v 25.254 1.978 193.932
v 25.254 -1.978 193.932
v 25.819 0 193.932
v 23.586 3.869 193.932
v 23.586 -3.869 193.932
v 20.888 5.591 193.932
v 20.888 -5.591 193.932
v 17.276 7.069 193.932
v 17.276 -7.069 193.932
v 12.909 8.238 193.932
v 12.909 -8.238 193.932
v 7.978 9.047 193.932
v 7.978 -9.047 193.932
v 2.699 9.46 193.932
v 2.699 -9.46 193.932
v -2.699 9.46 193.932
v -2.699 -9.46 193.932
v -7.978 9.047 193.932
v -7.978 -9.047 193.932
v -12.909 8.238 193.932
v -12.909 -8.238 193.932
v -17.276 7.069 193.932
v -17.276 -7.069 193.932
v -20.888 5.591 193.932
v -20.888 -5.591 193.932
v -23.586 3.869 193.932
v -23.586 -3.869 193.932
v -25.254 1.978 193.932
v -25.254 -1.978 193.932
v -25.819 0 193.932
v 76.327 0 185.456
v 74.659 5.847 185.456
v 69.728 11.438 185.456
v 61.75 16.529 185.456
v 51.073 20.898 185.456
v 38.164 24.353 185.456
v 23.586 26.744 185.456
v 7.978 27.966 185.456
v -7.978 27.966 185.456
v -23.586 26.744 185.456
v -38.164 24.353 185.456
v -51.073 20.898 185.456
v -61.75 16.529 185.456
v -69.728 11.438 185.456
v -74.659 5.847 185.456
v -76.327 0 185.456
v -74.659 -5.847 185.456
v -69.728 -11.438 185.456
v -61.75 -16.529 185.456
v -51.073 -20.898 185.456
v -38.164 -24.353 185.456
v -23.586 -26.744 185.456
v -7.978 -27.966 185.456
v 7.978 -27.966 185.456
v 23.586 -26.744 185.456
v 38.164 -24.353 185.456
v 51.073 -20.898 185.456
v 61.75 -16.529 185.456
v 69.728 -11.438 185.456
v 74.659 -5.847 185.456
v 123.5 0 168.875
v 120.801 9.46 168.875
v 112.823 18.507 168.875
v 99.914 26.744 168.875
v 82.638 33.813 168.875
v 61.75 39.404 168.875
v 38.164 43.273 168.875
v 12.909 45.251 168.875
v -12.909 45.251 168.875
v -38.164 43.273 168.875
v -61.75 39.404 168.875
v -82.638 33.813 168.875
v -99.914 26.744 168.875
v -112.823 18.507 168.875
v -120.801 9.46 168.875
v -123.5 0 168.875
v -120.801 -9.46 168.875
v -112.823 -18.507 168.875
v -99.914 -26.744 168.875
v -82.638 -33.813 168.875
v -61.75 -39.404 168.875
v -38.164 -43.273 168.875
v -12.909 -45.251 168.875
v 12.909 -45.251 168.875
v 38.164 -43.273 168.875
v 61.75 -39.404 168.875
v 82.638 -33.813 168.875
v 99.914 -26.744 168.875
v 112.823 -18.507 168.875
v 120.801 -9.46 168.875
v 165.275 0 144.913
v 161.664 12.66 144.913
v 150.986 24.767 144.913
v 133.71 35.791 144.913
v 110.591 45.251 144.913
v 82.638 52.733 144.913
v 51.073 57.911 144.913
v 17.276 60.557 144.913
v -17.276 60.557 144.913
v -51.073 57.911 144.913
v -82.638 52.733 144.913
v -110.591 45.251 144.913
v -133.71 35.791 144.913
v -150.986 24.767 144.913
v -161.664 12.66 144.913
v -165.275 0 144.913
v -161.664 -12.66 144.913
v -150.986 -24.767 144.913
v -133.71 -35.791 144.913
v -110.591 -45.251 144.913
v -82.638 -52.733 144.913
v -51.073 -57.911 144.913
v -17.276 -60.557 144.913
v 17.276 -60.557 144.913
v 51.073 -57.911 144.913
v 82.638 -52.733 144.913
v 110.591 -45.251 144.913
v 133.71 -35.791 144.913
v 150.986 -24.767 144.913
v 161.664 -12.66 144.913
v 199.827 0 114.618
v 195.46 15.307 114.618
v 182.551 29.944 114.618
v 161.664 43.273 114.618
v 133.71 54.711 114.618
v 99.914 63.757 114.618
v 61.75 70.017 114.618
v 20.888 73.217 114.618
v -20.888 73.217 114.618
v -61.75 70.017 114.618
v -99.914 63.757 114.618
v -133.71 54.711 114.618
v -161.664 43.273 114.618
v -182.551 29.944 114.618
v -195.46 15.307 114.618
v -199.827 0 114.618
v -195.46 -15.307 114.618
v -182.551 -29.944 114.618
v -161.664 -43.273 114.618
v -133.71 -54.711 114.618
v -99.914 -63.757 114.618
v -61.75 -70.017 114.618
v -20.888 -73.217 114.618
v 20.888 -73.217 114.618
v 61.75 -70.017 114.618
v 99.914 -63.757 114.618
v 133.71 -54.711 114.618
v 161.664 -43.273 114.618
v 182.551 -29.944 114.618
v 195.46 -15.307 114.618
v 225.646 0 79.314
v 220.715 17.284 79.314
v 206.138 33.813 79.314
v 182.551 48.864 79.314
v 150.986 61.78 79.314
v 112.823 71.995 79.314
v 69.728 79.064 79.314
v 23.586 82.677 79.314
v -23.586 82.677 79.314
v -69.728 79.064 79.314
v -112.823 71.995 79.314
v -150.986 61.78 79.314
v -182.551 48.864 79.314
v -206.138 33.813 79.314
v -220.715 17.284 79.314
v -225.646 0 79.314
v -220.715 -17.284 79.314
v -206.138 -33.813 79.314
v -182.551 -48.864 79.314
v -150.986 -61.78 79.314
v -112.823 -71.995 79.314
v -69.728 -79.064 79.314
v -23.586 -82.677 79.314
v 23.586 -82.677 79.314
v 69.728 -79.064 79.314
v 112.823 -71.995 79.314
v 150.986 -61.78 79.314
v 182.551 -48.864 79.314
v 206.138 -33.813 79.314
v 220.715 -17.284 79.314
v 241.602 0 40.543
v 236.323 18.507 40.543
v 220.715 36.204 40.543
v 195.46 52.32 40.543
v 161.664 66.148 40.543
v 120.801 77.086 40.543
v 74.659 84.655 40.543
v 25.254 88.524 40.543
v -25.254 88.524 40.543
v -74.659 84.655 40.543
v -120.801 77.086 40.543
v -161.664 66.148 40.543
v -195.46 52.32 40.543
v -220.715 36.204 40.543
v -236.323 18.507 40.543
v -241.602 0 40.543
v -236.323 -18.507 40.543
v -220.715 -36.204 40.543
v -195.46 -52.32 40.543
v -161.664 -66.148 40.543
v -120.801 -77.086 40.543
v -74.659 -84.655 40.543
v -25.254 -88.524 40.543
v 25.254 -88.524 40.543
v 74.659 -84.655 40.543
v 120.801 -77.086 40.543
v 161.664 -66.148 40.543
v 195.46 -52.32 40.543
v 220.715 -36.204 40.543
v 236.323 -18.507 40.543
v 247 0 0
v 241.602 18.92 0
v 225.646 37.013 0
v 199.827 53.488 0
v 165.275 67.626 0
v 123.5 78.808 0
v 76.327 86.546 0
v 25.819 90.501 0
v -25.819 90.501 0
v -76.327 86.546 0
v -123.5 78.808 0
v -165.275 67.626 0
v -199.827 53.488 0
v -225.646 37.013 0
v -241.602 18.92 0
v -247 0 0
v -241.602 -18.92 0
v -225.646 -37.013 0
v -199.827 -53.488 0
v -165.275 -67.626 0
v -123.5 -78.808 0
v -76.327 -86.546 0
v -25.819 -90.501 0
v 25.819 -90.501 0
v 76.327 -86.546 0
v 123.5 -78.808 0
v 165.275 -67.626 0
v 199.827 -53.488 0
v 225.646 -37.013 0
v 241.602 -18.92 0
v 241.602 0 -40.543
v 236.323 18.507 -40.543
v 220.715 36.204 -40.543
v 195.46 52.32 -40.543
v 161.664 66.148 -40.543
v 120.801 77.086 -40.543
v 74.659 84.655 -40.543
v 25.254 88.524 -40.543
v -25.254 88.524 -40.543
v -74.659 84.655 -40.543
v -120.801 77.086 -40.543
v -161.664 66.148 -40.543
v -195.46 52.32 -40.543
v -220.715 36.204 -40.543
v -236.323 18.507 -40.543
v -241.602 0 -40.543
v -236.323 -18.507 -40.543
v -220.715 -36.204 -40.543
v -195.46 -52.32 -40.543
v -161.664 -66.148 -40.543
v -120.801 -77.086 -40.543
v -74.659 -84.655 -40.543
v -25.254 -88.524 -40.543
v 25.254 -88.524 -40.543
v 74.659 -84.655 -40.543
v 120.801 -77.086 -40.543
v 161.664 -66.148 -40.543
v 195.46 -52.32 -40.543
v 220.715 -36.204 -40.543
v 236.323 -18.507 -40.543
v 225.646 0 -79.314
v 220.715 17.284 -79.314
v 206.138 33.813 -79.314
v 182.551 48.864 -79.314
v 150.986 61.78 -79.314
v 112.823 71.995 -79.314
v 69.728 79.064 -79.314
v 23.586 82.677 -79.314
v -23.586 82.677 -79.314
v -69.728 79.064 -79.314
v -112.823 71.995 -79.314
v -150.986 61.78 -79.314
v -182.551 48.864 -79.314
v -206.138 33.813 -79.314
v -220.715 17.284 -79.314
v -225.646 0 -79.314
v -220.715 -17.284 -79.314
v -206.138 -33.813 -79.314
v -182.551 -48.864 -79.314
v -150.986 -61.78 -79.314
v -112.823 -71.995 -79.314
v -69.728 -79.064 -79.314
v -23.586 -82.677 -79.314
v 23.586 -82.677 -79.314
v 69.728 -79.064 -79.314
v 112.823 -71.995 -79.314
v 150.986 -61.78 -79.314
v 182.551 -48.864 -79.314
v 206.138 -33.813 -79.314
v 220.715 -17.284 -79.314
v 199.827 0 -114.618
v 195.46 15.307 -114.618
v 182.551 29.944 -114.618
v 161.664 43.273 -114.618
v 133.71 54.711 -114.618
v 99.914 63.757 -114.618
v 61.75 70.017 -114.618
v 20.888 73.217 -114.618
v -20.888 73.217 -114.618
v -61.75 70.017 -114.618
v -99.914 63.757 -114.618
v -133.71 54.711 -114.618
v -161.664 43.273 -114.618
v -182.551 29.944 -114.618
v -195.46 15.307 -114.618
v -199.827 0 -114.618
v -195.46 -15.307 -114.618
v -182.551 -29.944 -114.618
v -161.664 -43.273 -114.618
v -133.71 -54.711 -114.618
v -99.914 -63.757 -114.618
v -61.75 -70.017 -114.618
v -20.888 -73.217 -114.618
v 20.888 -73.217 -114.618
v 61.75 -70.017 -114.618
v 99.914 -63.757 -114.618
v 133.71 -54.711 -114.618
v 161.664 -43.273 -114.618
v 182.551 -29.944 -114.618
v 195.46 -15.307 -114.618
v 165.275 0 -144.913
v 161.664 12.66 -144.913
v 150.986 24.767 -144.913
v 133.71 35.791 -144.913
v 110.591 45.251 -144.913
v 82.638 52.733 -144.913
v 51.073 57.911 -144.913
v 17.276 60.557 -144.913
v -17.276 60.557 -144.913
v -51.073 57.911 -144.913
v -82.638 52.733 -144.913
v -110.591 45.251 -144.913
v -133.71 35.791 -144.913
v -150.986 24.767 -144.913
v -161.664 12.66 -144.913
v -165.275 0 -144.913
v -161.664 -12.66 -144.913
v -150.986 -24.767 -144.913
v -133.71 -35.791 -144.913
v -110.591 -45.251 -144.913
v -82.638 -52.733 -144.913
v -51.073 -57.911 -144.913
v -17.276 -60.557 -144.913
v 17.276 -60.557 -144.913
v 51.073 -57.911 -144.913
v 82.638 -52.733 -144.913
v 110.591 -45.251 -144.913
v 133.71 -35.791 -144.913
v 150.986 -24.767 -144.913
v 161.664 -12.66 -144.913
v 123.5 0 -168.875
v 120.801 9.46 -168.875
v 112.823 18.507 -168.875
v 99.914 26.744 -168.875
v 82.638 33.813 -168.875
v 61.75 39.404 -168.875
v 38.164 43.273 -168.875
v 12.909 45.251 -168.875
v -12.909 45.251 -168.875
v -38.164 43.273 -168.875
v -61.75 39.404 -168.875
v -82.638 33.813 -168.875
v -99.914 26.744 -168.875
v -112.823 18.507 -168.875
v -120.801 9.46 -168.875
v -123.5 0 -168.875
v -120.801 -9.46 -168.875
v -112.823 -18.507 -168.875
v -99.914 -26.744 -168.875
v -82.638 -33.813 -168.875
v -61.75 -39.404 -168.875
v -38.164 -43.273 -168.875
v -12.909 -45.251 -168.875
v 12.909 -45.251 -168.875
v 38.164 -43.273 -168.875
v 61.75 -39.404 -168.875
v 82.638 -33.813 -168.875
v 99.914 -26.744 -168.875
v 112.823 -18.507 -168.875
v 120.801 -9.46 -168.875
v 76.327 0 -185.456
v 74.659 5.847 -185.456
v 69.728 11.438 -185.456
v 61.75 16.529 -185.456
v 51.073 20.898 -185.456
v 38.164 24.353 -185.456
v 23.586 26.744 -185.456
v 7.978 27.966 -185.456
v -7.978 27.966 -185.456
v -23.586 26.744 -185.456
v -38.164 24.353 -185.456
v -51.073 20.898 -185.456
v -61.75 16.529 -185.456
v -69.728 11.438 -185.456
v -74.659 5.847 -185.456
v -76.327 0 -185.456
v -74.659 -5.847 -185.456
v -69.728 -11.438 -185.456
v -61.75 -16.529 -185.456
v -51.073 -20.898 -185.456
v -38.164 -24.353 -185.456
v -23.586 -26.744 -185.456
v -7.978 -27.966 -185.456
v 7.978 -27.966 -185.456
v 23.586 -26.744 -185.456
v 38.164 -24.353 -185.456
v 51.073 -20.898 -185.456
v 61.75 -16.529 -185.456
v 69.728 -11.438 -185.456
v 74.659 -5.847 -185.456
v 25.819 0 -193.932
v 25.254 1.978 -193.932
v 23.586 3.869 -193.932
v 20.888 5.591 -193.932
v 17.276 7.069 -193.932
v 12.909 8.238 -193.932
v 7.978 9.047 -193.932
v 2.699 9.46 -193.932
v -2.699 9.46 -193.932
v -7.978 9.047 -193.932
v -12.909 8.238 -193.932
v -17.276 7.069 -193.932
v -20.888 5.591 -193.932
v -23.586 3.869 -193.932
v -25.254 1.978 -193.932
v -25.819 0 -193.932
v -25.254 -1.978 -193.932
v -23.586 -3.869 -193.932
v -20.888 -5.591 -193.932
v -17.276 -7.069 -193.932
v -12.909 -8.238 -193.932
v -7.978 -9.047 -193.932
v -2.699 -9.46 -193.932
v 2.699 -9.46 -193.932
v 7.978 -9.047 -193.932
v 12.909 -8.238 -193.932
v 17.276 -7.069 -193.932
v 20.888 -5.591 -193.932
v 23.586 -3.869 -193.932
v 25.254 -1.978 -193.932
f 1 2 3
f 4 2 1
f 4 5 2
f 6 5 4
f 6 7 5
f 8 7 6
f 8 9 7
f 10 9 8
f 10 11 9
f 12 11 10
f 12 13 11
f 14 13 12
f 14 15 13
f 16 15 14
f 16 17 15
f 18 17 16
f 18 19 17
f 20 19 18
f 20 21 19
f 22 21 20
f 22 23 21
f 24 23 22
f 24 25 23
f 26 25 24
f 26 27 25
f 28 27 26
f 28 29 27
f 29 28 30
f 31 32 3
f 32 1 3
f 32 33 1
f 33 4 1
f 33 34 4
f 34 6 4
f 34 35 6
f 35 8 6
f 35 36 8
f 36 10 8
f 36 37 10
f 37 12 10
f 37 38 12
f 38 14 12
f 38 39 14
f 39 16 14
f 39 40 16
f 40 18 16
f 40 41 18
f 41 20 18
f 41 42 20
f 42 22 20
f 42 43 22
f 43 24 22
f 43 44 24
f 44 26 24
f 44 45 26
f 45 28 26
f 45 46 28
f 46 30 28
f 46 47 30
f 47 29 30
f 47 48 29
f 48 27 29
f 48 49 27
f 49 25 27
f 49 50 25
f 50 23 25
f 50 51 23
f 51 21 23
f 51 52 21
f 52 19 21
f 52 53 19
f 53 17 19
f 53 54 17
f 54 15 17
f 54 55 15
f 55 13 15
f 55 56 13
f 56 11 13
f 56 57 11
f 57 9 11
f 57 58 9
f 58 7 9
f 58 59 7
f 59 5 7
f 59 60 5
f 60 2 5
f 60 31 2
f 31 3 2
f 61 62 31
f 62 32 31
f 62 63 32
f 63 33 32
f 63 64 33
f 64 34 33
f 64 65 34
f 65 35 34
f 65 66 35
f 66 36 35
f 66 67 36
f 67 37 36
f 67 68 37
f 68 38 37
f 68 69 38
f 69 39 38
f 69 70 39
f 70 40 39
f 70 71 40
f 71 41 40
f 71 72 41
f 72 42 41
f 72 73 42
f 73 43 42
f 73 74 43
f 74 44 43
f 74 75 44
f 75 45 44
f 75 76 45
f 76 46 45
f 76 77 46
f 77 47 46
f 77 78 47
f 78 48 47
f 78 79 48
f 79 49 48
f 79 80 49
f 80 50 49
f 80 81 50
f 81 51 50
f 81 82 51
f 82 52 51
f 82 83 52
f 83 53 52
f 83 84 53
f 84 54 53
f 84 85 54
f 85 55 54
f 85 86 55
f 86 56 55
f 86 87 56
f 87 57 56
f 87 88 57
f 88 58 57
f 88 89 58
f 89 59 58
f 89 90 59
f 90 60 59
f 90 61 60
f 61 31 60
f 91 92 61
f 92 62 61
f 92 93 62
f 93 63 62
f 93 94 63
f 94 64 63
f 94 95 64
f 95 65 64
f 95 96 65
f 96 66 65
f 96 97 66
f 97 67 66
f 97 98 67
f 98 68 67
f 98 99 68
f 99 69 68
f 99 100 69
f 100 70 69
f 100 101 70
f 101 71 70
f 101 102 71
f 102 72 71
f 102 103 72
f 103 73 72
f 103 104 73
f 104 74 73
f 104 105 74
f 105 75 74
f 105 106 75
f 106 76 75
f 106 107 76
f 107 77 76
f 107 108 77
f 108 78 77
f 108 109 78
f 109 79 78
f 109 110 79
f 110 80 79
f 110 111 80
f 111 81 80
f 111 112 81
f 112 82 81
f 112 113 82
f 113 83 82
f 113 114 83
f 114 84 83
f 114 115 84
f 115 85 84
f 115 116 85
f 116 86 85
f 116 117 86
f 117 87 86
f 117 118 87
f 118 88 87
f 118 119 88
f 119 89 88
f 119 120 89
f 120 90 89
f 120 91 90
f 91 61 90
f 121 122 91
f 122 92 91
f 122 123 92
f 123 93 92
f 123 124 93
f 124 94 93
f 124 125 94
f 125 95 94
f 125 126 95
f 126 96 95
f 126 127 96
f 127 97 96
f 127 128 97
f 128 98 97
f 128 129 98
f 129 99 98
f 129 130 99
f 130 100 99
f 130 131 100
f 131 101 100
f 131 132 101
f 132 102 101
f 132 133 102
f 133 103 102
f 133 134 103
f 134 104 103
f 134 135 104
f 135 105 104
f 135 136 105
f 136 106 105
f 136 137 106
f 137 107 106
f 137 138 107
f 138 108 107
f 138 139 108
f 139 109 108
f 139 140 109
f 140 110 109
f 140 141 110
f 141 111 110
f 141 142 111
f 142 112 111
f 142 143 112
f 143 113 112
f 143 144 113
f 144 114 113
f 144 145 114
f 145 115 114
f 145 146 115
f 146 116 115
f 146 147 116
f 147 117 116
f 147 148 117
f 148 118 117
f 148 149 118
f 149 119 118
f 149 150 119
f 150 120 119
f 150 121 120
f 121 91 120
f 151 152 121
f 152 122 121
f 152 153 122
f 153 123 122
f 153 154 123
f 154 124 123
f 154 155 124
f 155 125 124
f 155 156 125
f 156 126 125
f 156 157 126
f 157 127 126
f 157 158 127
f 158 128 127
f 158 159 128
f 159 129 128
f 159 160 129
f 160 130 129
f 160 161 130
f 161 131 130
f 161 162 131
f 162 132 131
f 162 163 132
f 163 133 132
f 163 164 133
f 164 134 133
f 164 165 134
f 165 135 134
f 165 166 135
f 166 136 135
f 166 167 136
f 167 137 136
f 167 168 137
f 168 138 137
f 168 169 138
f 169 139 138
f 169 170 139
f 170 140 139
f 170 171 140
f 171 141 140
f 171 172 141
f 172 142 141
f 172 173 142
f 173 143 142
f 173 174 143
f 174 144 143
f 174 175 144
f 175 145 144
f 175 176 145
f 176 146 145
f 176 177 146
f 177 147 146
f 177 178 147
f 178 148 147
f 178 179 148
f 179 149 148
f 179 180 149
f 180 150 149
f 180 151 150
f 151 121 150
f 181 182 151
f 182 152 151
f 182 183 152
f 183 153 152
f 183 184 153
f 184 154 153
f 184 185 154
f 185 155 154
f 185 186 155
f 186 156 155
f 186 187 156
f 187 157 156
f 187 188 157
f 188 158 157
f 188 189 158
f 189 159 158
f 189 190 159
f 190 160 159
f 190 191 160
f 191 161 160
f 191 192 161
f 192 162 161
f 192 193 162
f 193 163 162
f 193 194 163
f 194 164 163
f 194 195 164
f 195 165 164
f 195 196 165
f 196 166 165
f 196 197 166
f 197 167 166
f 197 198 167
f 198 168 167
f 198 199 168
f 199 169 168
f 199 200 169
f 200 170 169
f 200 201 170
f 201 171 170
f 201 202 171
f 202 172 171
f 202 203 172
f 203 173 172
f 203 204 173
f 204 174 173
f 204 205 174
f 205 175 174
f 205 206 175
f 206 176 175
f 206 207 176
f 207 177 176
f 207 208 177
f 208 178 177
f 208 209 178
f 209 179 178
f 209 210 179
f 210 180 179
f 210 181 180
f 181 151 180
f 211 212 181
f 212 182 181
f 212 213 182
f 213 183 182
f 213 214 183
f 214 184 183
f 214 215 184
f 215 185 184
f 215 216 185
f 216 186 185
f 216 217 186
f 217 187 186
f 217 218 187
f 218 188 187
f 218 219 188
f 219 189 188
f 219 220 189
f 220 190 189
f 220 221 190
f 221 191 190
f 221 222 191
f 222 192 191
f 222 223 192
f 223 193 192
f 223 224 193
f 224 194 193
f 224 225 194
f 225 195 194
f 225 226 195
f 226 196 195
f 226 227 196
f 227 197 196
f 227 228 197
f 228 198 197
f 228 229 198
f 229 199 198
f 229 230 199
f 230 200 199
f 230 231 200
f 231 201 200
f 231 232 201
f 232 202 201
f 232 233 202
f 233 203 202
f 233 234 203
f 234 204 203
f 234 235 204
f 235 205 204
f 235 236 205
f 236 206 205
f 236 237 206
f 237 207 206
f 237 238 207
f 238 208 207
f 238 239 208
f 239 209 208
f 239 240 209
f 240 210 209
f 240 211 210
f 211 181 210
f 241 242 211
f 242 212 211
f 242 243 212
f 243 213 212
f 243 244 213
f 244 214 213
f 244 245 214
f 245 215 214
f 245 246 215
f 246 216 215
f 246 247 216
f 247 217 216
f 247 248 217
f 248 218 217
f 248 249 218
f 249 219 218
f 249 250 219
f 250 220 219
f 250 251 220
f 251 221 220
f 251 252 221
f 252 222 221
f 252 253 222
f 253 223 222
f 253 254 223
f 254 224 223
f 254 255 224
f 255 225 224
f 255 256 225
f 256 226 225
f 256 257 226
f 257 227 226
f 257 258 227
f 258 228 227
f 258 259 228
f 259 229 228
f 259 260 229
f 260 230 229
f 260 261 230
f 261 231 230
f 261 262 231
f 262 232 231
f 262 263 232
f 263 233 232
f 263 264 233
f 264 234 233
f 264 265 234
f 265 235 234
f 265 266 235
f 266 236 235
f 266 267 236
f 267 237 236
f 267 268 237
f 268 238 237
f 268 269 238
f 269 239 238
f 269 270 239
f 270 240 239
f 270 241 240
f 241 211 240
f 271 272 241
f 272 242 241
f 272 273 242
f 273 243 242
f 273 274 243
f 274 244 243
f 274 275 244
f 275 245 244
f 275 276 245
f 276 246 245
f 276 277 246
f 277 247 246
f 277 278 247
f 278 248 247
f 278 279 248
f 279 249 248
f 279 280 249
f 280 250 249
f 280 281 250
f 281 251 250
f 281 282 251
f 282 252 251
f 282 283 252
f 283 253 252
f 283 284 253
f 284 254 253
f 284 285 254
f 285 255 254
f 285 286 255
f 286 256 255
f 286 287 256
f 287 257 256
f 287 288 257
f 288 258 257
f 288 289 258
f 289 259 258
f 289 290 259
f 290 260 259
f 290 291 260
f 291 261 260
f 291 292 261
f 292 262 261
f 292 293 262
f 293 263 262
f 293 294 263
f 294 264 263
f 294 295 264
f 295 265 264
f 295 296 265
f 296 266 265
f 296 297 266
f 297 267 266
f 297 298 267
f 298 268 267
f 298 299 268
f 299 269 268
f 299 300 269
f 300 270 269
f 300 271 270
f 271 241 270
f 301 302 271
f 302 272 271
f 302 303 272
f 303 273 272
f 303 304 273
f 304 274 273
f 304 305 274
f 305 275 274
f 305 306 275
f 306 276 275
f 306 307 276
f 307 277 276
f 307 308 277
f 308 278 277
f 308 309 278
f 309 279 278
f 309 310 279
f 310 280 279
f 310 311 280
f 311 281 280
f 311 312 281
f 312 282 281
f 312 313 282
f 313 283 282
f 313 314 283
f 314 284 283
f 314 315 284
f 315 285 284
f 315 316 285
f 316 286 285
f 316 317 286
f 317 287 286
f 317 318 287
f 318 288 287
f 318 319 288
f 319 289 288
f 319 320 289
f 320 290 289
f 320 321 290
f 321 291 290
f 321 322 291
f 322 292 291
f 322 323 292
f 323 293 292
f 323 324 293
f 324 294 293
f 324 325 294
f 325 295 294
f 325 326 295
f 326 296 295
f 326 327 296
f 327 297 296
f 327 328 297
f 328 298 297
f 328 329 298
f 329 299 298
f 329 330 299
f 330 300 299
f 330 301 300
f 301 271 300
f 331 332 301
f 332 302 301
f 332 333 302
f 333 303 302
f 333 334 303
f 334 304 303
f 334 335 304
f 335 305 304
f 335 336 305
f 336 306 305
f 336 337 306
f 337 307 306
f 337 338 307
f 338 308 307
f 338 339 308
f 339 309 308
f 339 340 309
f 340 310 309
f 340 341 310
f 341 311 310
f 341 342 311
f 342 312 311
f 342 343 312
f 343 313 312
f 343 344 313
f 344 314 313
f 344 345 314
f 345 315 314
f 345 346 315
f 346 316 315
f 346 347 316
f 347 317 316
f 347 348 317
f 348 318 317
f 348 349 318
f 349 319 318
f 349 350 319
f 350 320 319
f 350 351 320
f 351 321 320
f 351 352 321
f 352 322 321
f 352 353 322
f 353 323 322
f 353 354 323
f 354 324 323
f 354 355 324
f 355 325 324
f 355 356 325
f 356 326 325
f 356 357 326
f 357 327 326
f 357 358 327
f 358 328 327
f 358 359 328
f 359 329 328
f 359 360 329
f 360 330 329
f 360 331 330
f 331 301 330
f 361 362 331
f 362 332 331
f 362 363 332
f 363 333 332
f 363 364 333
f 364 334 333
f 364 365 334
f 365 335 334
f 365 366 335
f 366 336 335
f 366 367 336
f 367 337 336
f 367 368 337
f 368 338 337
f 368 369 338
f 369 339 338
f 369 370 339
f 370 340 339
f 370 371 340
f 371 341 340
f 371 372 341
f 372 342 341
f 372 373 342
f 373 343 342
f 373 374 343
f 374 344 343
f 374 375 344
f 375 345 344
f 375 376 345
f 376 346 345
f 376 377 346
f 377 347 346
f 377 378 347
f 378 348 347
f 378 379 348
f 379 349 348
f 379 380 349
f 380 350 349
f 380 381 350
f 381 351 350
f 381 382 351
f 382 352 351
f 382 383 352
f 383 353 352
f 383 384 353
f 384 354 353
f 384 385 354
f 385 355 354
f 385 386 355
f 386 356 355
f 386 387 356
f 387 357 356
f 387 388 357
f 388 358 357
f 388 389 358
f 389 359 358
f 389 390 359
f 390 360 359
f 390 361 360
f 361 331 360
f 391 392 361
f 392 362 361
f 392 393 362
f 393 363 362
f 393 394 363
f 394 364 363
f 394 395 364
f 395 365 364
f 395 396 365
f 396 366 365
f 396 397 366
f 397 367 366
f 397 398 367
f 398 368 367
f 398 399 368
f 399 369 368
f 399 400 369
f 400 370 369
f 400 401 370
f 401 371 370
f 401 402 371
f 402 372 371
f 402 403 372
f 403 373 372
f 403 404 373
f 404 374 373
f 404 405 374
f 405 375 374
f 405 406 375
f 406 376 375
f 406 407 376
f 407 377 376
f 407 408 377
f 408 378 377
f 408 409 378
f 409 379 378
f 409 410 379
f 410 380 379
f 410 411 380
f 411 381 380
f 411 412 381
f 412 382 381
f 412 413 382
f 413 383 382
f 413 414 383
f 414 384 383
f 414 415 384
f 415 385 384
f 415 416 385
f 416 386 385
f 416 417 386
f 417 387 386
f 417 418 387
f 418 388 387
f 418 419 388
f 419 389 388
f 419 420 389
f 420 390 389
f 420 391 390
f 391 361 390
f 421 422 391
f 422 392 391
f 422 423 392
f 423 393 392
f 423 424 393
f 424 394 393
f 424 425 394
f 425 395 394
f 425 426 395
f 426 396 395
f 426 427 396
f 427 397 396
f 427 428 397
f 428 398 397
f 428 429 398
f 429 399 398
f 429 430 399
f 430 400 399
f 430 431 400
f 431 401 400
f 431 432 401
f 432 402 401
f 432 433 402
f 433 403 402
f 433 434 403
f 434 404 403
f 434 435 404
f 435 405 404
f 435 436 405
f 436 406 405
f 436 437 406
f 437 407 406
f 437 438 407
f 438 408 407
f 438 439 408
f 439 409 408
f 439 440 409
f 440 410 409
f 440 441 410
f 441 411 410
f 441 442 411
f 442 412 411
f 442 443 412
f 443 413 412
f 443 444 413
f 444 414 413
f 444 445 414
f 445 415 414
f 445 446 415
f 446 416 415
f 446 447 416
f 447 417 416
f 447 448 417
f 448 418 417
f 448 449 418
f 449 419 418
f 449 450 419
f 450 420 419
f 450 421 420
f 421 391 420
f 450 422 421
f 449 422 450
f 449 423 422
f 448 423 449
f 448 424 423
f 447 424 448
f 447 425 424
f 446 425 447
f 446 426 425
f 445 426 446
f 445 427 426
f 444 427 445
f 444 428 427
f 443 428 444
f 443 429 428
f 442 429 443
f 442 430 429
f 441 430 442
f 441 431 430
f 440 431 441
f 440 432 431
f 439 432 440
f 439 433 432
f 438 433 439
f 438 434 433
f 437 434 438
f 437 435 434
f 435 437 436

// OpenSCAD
// Generated by SolidPython 1.0.1 on 2020-07-29 00:46:53


scale(v = [19, 7, 15]) {
	sphere(r = 13);
}
/***********************************************
*********      SolidPython code:      **********
************************************************
 
# import packages: SolidPython
from solid import *
from solid.utils import *
from itertools import chain, combinations, permutations


class Resize:

    def __init__(self, scad_file):
        self.scad_file = scad_file
        #self.scad_file = import_scad(scad_file)
        # cone/cylinder param:
        self.r1 = 0
        self.r2 = 0
        self.h = 0
        # rectangular prism param:
        self.w = 0
        self.l = 0
        # ellipse param:
        self.r = 0

    # import OpenScad code (file name corresponds to shape)


    # classify shape + parameters
    def assign(self, param1, param2, param3):
        if self.scad_file == 'cone.scad':
            self.r1 = param1
            self.r2 = param2
            self.h = param3
        elif self.scad_file == 'cylinder.scad':
            self.r1 = param1
            self.r2 = param2
            self.h = param3
        elif self.scad_file == 'rectangularPrism.scad':
            self.h = param1
            self.l = param2
            self.w = param3
        else:
            self.r = param1
            self.h = param2

    # resize parameters
    def iterate(self):
        x = range(3, 20, 2)
        i = 1
        if self.scad_file == 'cone.scad':
            tempList = list(permutations(x, 2))
            for temp in tempList:
                param1 = temp[0]
                param2 = temp[1]
                filepath = 'produced_scad_files/' + 'cone' + str(param1) + '_' + str(param2) + '_' + '.scad'
                scad_render_to_file(cylinder(h=param1, r1=param2, r2=0), filepath)

        elif self.scad_file == 'cylinder.scad':
            tempList = list(permutations(x, 3))
            for temp in tempList:
                param1 = temp[0]
                param2 = temp[1]
                filepath = 'produced_scad_files/' + 'cylinder' + str(param1) + '_' + str(param2) + '_' + '.scad'
                scad_render_to_file(cylinder(h=param1, r1=param2, r2=param2), filepath)

        elif self.scad_file == 'rectangularPrism.scad':
            tempList = list(permutations(x, 3))
            for temp in tempList:
                param1 = temp[0]
                param2 = temp[1]
                param3 = temp[2]
                filepath = 'produced_scad_files/' + 'rectangularPrism' + str(param1) + '_' + str(param2) + '_' + str(
                    param3) + '.scad'
                scad_render_to_file(cube(size=(param1, param2, param3)), filepath)

        elif self.scad_file == 'ellipse.scad':
            tempList = list(permutations(x, 4))
            for temp in tempList:
                param1 = temp[0]
                param2 = temp[1]
                param3 = temp[2]
                param4 = temp[3]
                filepath = 'produced_scad_files/' + 'ellipse' + str(param1) + '_' + str(param2) + '_' + str(param3) + '_' + str(param4) + '.scad'
                scad_render_to_file(scale([param1, param2, param3])(sphere(r=param4)), filepath)

    def render_to_scadfile(self):
        scad_render_to_file(scad, 'example.scad') 
 
************************************************/
